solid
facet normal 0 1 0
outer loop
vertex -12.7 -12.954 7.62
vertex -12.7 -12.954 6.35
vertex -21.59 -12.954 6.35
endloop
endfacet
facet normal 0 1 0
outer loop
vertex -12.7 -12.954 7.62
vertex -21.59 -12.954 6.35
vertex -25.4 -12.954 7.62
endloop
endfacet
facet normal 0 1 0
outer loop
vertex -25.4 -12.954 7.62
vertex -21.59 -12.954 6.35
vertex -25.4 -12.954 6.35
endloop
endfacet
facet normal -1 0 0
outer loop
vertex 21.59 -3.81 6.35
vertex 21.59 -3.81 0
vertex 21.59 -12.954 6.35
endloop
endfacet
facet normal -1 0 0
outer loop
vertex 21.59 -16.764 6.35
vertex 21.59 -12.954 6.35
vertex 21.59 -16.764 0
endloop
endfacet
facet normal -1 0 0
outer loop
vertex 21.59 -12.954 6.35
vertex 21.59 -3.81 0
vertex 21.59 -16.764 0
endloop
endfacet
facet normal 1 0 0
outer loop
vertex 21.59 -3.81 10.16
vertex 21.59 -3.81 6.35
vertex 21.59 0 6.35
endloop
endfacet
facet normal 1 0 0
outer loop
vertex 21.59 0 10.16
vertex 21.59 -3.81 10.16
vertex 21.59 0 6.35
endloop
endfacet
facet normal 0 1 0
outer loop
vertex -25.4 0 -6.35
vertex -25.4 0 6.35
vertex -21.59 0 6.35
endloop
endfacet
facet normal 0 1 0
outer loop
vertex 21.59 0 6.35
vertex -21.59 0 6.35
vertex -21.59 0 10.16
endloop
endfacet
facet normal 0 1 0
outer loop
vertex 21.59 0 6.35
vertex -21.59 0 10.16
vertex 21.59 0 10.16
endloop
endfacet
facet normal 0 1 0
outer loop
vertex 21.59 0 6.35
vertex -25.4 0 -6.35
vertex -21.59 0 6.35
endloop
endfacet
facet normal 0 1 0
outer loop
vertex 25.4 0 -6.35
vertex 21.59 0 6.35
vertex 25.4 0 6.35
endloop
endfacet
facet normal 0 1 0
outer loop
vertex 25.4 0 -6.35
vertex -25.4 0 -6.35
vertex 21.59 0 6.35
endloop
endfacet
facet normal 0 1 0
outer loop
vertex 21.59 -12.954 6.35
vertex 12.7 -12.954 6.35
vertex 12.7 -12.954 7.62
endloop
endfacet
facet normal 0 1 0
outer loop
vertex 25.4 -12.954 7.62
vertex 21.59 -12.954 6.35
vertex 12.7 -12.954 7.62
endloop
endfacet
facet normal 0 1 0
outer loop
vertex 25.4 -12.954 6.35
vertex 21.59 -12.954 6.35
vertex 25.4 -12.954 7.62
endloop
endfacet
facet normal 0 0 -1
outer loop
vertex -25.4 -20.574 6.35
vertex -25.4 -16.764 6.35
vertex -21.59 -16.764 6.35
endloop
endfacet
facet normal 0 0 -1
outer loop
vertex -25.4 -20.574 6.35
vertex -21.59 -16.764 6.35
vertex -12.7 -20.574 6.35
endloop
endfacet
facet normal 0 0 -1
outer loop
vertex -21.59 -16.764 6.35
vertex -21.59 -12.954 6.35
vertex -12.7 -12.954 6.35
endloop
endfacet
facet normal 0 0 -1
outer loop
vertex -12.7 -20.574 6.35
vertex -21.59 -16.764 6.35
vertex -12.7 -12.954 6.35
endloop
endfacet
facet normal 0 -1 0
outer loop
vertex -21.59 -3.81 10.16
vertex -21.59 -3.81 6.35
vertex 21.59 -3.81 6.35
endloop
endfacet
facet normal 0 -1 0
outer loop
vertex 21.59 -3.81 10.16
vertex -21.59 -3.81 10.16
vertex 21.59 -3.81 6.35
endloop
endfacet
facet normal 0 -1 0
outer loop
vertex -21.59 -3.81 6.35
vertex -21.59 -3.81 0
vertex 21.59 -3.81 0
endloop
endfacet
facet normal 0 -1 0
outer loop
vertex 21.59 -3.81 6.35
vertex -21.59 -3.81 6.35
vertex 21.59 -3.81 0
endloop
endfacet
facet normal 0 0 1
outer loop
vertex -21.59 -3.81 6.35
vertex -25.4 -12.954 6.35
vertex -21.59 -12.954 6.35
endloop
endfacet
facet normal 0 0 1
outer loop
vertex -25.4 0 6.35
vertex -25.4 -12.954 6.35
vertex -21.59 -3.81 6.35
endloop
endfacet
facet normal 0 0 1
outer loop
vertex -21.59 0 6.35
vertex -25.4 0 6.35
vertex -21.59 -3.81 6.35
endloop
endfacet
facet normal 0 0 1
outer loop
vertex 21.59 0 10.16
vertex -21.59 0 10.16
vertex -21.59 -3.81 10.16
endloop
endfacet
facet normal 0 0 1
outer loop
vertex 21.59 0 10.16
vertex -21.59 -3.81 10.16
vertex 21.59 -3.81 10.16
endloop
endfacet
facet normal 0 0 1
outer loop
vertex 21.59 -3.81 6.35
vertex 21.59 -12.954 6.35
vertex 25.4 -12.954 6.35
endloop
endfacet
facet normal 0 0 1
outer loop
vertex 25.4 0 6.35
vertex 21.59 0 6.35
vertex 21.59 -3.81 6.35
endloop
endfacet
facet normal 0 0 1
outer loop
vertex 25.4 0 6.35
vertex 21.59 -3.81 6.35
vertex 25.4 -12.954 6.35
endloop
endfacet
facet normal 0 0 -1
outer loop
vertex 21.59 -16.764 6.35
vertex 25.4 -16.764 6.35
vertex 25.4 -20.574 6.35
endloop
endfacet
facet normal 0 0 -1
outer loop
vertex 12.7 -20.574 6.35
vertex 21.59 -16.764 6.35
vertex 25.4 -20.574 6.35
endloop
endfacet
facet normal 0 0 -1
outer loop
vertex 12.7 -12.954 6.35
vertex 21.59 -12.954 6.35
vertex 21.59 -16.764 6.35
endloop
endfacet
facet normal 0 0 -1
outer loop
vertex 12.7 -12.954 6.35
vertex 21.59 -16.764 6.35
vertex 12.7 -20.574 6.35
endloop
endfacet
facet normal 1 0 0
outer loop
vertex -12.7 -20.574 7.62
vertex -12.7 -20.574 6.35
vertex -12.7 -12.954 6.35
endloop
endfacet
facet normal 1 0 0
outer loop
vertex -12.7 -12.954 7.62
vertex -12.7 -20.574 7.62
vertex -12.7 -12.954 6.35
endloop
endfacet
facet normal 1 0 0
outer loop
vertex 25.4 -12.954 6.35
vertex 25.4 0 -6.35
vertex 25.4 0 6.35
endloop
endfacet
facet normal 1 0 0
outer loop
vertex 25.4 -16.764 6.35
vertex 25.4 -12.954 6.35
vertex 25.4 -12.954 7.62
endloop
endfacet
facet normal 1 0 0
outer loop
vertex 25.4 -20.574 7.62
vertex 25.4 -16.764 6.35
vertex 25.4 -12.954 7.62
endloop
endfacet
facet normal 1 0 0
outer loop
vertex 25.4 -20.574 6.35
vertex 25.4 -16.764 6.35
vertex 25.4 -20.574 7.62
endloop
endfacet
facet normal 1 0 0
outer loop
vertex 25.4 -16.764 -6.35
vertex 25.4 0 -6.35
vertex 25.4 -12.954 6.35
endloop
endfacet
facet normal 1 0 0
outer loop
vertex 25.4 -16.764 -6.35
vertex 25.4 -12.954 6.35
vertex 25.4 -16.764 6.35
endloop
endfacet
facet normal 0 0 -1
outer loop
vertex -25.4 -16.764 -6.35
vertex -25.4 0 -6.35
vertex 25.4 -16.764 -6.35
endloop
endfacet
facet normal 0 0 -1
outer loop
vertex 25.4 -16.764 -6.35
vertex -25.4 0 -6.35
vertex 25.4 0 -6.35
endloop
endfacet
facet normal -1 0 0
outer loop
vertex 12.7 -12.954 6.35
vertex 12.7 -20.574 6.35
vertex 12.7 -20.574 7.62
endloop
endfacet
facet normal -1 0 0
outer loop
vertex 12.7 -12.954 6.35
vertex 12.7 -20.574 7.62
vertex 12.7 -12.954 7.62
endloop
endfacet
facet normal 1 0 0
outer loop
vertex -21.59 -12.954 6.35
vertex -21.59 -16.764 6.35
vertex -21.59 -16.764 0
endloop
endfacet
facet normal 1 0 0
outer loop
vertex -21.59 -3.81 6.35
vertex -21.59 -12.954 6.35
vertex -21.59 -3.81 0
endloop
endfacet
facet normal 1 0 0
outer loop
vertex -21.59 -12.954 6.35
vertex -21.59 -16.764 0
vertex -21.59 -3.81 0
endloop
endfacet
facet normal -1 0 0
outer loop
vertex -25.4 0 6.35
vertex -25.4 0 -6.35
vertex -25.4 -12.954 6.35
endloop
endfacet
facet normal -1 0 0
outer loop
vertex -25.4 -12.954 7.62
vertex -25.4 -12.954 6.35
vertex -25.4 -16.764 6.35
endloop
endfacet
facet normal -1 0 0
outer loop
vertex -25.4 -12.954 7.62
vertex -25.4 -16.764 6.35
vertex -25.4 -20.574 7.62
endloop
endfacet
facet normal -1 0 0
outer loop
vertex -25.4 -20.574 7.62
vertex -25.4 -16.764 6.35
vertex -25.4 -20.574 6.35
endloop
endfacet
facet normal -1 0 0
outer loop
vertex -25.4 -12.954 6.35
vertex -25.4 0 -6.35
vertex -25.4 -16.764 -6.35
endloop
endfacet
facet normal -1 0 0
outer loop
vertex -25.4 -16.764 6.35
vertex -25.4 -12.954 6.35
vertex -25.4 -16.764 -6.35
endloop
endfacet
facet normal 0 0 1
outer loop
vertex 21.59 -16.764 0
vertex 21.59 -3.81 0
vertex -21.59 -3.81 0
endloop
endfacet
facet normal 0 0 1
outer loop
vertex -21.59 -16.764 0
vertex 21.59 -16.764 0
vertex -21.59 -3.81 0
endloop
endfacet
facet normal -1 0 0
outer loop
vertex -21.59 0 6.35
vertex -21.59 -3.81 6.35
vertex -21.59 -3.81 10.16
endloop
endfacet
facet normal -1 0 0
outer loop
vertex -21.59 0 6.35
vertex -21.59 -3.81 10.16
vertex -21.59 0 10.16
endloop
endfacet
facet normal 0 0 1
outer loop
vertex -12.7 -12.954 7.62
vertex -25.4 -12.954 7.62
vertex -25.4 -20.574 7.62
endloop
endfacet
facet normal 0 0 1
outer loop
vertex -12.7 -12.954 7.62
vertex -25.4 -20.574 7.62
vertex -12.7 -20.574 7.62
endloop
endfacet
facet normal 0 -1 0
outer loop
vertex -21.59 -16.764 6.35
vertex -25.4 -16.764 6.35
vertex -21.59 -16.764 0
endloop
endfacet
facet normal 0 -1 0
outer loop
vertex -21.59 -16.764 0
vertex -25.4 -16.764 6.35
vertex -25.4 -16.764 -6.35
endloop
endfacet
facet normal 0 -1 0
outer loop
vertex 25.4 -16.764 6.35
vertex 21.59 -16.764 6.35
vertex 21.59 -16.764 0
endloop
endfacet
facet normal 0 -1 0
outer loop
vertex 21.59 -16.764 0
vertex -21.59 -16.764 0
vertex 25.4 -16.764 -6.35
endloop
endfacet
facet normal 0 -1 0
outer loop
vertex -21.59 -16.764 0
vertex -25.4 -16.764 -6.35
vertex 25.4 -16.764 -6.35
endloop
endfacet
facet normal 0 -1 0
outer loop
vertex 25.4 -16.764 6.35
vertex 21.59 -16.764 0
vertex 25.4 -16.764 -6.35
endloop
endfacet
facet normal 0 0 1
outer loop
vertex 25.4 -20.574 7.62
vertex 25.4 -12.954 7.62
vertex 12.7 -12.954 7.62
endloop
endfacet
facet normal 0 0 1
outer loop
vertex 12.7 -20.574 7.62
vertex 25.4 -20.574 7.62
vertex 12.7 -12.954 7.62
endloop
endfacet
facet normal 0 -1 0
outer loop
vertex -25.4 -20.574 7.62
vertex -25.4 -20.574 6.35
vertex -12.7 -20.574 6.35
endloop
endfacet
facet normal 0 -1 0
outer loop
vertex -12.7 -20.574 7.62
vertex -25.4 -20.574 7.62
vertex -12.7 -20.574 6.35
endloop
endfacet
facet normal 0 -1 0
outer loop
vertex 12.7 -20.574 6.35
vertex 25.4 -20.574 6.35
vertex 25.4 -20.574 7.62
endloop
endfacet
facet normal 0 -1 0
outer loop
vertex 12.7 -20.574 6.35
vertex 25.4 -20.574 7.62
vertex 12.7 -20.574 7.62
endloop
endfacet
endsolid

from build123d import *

# Parameters (mm, degrees)
F1_DEPTH = 16.764
F3_DEPTH = 6.35
F4_W     = 43.18
F4_H     = 3.81
F5_DEPTH = 3.81
F7_DEPTH = 1.27


with BuildPart() as f1:
    # F0 (on Front) → F1 (new body)
    with BuildSketch(Plane.XZ):
        Polygon((-25.4, -6.35), (0, -6.35), (25.4, -6.35), (25.4, 0), (-25.4, 0), align=None)
    extrude(amount=F1_DEPTH)

    # F2 (on face) → F3 (join)
    with BuildSketch(Plane.XY):
        Polygon((-25.4, 0), (-25.4, -16.764), (-21.59, -16.764), (-21.59, -3.81), (0, -3.81), (21.59, -3.81), (21.59, -16.764), (25.4, -16.764), (25.4, 0), align=None)
    extrude(amount=F3_DEPTH)

    # F4 (on face) → F5 (join)
    with BuildSketch(Plane.XY.offset(6.35)):
        with Locations((0, -1.905)):
            Rectangle(F4_W, F4_H)
    extrude(amount=F5_DEPTH)

    # F6 (on face) → F7 (join)
    with BuildSketch(Plane.XY.offset(6.35)):
        Polygon((-25.4, -12.954), (-25.4, -16.764), (-25.4, -20.574), (-12.7, -20.574), (-12.7, -12.954), align=None)
    extrude(amount=F7_DEPTH)

    # F8: F1 across plane


with BuildPart() as f1_1:
    add(f1.part)
    add(f1.part.mirror(Plane.YZ))


solid = f1_1.part
